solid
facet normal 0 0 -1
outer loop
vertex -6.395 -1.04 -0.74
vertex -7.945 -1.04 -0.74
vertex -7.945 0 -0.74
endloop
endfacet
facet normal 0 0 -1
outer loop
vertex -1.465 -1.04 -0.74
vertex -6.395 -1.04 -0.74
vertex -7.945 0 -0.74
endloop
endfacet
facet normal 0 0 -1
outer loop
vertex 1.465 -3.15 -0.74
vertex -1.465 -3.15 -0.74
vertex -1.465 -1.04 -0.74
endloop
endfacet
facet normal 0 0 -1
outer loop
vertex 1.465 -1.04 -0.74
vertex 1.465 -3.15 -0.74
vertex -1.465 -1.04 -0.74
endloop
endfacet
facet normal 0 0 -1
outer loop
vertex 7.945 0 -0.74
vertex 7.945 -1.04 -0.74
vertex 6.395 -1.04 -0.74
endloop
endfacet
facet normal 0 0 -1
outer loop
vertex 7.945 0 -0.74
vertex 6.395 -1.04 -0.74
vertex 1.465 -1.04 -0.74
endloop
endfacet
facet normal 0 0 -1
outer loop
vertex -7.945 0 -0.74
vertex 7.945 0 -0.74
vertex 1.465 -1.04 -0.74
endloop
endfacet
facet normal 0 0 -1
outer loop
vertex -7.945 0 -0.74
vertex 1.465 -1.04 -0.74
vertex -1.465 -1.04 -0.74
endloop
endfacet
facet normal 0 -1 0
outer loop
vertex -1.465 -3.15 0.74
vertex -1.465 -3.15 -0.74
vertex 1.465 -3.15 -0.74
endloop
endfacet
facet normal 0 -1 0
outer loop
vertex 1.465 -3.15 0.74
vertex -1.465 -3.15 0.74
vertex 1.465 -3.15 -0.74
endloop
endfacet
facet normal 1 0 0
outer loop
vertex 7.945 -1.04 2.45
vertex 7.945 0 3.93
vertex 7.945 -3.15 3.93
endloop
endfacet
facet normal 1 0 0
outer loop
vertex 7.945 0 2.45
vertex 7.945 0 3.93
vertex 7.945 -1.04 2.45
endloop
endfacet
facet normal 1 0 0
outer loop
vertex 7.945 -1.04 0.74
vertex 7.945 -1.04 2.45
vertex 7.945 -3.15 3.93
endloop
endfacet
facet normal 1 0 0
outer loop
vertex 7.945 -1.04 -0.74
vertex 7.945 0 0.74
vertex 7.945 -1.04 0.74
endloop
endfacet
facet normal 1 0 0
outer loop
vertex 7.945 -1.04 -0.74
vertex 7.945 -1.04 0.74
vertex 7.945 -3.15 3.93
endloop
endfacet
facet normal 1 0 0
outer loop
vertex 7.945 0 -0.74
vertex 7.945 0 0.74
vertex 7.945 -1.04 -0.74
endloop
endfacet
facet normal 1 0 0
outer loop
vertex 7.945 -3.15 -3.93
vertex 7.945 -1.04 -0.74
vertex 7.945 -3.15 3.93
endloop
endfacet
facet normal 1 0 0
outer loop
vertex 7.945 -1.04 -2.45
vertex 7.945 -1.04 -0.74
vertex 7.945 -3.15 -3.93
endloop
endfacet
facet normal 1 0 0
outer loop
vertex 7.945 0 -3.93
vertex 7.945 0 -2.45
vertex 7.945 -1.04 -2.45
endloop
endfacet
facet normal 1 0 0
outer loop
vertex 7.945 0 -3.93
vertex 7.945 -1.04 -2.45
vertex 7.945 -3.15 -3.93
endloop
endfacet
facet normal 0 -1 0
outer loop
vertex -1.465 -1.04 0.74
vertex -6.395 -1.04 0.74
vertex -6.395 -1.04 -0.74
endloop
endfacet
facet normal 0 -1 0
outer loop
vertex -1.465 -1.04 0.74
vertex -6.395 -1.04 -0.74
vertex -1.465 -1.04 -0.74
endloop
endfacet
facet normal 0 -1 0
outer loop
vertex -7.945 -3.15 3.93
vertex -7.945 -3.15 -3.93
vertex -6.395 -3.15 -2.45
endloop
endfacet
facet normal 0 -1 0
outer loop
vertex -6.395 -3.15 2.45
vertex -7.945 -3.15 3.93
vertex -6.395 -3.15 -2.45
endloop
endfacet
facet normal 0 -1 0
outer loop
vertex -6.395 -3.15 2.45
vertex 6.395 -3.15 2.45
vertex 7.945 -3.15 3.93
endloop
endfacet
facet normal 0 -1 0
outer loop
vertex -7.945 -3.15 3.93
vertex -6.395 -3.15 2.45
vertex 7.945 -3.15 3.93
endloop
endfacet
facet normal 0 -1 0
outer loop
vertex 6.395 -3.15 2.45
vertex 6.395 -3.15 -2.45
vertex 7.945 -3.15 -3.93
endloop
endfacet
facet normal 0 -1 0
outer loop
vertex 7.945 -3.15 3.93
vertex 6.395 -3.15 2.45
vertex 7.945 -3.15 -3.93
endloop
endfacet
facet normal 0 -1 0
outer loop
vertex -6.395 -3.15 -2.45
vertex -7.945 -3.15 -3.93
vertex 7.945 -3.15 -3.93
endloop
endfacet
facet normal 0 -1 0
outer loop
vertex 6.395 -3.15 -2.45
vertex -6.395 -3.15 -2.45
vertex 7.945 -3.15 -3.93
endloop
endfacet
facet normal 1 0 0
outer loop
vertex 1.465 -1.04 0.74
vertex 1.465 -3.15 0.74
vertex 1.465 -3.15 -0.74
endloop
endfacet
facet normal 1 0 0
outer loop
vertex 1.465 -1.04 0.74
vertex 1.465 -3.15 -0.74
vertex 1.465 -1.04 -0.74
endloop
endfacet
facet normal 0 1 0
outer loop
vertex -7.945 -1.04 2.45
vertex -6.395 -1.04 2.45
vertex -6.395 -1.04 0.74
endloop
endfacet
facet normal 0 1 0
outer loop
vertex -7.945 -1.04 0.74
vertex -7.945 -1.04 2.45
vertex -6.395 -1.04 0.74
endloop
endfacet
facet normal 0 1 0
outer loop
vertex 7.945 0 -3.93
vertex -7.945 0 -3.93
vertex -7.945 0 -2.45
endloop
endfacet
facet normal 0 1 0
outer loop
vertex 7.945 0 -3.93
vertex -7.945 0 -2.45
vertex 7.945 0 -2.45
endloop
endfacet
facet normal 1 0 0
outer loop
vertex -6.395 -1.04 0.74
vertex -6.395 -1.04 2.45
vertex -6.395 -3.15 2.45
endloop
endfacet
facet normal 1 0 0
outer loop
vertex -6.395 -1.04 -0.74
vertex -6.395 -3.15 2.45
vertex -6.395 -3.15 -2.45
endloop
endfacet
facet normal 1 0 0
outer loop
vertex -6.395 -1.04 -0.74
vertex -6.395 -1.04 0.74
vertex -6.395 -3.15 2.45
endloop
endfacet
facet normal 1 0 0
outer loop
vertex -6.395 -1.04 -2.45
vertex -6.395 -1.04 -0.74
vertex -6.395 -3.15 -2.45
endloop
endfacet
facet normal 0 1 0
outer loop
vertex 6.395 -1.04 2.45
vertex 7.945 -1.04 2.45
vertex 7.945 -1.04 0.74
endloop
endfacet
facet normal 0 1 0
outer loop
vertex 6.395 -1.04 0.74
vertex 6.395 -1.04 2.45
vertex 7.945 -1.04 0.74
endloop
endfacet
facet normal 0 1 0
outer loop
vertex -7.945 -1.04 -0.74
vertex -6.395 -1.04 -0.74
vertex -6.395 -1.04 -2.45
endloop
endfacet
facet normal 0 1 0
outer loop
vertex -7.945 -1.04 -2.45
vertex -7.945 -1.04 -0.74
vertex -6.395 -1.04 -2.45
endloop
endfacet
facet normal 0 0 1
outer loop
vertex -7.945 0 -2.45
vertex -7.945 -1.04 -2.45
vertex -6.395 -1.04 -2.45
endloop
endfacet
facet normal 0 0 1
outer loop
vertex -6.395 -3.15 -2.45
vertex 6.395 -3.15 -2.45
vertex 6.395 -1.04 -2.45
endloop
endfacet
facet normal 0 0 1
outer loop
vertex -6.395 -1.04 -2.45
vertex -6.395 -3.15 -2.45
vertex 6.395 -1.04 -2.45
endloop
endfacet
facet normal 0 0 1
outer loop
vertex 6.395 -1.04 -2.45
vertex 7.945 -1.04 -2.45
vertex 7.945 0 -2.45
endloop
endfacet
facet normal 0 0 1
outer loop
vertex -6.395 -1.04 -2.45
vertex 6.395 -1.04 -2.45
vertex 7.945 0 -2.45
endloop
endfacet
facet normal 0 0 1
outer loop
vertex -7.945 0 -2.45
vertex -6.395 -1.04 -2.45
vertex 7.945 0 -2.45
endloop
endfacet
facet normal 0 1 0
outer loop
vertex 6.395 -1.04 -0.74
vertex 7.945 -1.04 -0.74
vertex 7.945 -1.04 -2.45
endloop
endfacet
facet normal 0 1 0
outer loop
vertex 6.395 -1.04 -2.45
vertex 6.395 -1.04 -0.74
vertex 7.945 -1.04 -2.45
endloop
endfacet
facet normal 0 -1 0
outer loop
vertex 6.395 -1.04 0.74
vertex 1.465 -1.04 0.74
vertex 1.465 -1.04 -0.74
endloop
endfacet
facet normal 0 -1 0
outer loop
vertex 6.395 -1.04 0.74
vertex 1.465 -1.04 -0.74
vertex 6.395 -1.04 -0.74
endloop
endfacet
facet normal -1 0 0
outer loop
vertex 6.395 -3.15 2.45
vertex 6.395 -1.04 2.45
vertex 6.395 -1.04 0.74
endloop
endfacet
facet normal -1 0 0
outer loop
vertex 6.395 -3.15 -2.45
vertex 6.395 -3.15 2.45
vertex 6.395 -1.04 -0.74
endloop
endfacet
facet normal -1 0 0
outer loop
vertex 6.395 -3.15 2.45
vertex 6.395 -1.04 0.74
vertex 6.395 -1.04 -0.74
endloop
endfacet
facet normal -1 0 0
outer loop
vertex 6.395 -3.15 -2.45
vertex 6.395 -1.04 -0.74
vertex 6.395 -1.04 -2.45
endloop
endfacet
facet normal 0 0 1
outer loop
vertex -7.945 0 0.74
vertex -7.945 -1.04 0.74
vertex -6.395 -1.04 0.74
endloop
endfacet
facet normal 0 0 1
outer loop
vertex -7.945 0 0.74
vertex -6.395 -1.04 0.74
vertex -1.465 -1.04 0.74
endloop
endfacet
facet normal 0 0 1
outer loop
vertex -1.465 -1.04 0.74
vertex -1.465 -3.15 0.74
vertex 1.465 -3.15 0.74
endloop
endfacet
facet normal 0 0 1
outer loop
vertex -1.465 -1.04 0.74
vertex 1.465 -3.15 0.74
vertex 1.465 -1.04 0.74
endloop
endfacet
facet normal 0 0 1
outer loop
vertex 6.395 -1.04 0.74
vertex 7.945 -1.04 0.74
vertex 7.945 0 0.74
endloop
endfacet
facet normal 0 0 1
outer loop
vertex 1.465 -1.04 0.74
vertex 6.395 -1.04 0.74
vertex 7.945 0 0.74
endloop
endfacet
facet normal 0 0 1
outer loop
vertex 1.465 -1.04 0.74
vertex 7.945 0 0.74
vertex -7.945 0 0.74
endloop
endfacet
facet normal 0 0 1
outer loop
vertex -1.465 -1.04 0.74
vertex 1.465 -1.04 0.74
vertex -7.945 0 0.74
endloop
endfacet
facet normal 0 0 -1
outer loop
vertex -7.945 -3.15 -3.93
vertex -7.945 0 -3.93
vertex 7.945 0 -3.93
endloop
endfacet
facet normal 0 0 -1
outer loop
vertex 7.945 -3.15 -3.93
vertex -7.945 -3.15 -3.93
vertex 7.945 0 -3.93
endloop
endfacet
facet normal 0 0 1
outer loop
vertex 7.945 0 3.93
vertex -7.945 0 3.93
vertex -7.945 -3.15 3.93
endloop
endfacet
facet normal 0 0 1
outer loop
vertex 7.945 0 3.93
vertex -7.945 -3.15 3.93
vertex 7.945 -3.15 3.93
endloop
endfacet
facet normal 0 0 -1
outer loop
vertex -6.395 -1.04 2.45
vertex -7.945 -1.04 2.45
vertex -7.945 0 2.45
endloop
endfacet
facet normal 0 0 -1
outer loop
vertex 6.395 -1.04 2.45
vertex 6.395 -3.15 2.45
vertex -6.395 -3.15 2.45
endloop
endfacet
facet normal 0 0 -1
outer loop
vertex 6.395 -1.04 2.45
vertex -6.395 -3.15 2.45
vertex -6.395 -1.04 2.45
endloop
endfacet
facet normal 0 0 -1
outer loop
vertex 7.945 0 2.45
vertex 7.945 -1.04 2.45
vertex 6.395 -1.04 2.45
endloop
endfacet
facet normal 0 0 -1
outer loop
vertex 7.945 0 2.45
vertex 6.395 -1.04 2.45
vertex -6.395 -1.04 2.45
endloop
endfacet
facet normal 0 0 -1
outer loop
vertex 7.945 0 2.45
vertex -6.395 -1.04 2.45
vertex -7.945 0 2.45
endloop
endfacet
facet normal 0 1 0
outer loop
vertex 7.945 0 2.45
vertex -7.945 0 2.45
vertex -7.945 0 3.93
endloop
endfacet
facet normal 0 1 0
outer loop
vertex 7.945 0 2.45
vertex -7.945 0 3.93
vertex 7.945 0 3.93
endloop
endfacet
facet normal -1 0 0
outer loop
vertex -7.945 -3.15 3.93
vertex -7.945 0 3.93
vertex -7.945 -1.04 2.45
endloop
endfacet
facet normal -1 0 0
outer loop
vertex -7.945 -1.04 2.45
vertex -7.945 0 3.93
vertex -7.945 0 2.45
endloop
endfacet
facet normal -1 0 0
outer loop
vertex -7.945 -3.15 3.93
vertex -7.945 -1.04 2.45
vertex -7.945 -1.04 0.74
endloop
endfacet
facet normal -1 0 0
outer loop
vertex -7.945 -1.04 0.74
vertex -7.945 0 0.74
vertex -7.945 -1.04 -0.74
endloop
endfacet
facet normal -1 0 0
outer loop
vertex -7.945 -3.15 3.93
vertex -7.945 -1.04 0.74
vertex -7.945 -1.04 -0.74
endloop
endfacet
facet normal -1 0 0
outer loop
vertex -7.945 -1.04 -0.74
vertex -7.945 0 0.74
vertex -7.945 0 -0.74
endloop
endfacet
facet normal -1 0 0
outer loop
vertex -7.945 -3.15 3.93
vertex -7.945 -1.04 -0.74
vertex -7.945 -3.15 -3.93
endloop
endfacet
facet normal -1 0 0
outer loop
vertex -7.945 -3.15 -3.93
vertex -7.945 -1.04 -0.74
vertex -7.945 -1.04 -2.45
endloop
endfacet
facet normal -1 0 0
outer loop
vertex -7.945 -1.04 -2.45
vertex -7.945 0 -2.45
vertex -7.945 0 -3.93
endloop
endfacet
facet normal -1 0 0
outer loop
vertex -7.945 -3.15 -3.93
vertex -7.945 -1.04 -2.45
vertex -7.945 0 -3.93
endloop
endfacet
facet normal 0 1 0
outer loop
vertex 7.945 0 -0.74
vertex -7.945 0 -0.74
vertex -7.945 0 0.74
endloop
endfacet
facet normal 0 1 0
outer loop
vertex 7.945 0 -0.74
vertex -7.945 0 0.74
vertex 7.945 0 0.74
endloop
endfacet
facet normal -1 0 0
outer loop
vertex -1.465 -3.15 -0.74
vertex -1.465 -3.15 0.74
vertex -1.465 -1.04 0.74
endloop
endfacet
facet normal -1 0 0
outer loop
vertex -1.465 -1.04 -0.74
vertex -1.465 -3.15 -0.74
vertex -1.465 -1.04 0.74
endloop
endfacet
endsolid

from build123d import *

# Parameters (mm, degrees)
SKETCH1_W           = 15.89
SKETCH1_H           = 7.86
BOSS_EXTRUDE1_DEPTH = 3.15
SKETCH2_W           = 1.71
SKETCH2_H           = 1.04
CUT_EXTRUDE1_DEPTH  = 17.669118153
SKETCH3_W           = 12.79
SKETCH3_H           = 1.71
CUT_EXTRUDE2_DEPTH  = 10.111532528
SKETCH4_W           = 4.93
SKETCH4_H           = 2.11
CUT_EXTRUDE3_DEPTH  = 1.6


with BuildPart() as part:
    # Sketch1 → Boss-Extrude1 (new body)
    with BuildSketch(Plane(origin=(0, 0, 0), x_dir=(1, 0, 0), z_dir=(0, 1, 0))):
        Rectangle(SKETCH1_W, SKETCH1_H)
    extrude(amount=-BOSS_EXTRUDE1_DEPTH)

    # Sketch2 → Cut-Extrude1 (cut, through all)
    with BuildSketch(Plane(origin=(7.945, 0, 0), x_dir=(0, 0, -1), z_dir=(1, 0, 0))):
        with Locations((1.595, -0.52)):
            Rectangle(SKETCH2_W, SKETCH2_H)
        with Locations((-1.595, -0.52)):
            Rectangle(SKETCH2_W, SKETCH2_H)
    extrude(amount=-CUT_EXTRUDE1_DEPTH, mode=Mode.SUBTRACT)

    # Sketch3 → Cut-Extrude2 (cut, through all)
    with BuildSketch(Plane(origin=(0, -1.04, 0), x_dir=(1, 0, 0), z_dir=(0, 1, 0))):
        with Locations((0, 1.595)):
            Rectangle(SKETCH3_W, SKETCH3_H)
        with Locations((0, -1.595)):
            Rectangle(SKETCH3_W, SKETCH3_H)
    extrude(amount=-CUT_EXTRUDE2_DEPTH, mode=Mode.SUBTRACT)

    # Sketch4 → Cut-Extrude3 (cut)
    with BuildSketch(Plane.XY.offset(0.74)):
        with Locations((-3.93, -2.095)):
            Rectangle(SKETCH4_W, SKETCH4_H)
        with Locations((3.93, -2.095)):
            Rectangle(SKETCH4_W, SKETCH4_H)
    extrude(amount=-CUT_EXTRUDE3_DEPTH, mode=Mode.SUBTRACT)


solid = part.part
